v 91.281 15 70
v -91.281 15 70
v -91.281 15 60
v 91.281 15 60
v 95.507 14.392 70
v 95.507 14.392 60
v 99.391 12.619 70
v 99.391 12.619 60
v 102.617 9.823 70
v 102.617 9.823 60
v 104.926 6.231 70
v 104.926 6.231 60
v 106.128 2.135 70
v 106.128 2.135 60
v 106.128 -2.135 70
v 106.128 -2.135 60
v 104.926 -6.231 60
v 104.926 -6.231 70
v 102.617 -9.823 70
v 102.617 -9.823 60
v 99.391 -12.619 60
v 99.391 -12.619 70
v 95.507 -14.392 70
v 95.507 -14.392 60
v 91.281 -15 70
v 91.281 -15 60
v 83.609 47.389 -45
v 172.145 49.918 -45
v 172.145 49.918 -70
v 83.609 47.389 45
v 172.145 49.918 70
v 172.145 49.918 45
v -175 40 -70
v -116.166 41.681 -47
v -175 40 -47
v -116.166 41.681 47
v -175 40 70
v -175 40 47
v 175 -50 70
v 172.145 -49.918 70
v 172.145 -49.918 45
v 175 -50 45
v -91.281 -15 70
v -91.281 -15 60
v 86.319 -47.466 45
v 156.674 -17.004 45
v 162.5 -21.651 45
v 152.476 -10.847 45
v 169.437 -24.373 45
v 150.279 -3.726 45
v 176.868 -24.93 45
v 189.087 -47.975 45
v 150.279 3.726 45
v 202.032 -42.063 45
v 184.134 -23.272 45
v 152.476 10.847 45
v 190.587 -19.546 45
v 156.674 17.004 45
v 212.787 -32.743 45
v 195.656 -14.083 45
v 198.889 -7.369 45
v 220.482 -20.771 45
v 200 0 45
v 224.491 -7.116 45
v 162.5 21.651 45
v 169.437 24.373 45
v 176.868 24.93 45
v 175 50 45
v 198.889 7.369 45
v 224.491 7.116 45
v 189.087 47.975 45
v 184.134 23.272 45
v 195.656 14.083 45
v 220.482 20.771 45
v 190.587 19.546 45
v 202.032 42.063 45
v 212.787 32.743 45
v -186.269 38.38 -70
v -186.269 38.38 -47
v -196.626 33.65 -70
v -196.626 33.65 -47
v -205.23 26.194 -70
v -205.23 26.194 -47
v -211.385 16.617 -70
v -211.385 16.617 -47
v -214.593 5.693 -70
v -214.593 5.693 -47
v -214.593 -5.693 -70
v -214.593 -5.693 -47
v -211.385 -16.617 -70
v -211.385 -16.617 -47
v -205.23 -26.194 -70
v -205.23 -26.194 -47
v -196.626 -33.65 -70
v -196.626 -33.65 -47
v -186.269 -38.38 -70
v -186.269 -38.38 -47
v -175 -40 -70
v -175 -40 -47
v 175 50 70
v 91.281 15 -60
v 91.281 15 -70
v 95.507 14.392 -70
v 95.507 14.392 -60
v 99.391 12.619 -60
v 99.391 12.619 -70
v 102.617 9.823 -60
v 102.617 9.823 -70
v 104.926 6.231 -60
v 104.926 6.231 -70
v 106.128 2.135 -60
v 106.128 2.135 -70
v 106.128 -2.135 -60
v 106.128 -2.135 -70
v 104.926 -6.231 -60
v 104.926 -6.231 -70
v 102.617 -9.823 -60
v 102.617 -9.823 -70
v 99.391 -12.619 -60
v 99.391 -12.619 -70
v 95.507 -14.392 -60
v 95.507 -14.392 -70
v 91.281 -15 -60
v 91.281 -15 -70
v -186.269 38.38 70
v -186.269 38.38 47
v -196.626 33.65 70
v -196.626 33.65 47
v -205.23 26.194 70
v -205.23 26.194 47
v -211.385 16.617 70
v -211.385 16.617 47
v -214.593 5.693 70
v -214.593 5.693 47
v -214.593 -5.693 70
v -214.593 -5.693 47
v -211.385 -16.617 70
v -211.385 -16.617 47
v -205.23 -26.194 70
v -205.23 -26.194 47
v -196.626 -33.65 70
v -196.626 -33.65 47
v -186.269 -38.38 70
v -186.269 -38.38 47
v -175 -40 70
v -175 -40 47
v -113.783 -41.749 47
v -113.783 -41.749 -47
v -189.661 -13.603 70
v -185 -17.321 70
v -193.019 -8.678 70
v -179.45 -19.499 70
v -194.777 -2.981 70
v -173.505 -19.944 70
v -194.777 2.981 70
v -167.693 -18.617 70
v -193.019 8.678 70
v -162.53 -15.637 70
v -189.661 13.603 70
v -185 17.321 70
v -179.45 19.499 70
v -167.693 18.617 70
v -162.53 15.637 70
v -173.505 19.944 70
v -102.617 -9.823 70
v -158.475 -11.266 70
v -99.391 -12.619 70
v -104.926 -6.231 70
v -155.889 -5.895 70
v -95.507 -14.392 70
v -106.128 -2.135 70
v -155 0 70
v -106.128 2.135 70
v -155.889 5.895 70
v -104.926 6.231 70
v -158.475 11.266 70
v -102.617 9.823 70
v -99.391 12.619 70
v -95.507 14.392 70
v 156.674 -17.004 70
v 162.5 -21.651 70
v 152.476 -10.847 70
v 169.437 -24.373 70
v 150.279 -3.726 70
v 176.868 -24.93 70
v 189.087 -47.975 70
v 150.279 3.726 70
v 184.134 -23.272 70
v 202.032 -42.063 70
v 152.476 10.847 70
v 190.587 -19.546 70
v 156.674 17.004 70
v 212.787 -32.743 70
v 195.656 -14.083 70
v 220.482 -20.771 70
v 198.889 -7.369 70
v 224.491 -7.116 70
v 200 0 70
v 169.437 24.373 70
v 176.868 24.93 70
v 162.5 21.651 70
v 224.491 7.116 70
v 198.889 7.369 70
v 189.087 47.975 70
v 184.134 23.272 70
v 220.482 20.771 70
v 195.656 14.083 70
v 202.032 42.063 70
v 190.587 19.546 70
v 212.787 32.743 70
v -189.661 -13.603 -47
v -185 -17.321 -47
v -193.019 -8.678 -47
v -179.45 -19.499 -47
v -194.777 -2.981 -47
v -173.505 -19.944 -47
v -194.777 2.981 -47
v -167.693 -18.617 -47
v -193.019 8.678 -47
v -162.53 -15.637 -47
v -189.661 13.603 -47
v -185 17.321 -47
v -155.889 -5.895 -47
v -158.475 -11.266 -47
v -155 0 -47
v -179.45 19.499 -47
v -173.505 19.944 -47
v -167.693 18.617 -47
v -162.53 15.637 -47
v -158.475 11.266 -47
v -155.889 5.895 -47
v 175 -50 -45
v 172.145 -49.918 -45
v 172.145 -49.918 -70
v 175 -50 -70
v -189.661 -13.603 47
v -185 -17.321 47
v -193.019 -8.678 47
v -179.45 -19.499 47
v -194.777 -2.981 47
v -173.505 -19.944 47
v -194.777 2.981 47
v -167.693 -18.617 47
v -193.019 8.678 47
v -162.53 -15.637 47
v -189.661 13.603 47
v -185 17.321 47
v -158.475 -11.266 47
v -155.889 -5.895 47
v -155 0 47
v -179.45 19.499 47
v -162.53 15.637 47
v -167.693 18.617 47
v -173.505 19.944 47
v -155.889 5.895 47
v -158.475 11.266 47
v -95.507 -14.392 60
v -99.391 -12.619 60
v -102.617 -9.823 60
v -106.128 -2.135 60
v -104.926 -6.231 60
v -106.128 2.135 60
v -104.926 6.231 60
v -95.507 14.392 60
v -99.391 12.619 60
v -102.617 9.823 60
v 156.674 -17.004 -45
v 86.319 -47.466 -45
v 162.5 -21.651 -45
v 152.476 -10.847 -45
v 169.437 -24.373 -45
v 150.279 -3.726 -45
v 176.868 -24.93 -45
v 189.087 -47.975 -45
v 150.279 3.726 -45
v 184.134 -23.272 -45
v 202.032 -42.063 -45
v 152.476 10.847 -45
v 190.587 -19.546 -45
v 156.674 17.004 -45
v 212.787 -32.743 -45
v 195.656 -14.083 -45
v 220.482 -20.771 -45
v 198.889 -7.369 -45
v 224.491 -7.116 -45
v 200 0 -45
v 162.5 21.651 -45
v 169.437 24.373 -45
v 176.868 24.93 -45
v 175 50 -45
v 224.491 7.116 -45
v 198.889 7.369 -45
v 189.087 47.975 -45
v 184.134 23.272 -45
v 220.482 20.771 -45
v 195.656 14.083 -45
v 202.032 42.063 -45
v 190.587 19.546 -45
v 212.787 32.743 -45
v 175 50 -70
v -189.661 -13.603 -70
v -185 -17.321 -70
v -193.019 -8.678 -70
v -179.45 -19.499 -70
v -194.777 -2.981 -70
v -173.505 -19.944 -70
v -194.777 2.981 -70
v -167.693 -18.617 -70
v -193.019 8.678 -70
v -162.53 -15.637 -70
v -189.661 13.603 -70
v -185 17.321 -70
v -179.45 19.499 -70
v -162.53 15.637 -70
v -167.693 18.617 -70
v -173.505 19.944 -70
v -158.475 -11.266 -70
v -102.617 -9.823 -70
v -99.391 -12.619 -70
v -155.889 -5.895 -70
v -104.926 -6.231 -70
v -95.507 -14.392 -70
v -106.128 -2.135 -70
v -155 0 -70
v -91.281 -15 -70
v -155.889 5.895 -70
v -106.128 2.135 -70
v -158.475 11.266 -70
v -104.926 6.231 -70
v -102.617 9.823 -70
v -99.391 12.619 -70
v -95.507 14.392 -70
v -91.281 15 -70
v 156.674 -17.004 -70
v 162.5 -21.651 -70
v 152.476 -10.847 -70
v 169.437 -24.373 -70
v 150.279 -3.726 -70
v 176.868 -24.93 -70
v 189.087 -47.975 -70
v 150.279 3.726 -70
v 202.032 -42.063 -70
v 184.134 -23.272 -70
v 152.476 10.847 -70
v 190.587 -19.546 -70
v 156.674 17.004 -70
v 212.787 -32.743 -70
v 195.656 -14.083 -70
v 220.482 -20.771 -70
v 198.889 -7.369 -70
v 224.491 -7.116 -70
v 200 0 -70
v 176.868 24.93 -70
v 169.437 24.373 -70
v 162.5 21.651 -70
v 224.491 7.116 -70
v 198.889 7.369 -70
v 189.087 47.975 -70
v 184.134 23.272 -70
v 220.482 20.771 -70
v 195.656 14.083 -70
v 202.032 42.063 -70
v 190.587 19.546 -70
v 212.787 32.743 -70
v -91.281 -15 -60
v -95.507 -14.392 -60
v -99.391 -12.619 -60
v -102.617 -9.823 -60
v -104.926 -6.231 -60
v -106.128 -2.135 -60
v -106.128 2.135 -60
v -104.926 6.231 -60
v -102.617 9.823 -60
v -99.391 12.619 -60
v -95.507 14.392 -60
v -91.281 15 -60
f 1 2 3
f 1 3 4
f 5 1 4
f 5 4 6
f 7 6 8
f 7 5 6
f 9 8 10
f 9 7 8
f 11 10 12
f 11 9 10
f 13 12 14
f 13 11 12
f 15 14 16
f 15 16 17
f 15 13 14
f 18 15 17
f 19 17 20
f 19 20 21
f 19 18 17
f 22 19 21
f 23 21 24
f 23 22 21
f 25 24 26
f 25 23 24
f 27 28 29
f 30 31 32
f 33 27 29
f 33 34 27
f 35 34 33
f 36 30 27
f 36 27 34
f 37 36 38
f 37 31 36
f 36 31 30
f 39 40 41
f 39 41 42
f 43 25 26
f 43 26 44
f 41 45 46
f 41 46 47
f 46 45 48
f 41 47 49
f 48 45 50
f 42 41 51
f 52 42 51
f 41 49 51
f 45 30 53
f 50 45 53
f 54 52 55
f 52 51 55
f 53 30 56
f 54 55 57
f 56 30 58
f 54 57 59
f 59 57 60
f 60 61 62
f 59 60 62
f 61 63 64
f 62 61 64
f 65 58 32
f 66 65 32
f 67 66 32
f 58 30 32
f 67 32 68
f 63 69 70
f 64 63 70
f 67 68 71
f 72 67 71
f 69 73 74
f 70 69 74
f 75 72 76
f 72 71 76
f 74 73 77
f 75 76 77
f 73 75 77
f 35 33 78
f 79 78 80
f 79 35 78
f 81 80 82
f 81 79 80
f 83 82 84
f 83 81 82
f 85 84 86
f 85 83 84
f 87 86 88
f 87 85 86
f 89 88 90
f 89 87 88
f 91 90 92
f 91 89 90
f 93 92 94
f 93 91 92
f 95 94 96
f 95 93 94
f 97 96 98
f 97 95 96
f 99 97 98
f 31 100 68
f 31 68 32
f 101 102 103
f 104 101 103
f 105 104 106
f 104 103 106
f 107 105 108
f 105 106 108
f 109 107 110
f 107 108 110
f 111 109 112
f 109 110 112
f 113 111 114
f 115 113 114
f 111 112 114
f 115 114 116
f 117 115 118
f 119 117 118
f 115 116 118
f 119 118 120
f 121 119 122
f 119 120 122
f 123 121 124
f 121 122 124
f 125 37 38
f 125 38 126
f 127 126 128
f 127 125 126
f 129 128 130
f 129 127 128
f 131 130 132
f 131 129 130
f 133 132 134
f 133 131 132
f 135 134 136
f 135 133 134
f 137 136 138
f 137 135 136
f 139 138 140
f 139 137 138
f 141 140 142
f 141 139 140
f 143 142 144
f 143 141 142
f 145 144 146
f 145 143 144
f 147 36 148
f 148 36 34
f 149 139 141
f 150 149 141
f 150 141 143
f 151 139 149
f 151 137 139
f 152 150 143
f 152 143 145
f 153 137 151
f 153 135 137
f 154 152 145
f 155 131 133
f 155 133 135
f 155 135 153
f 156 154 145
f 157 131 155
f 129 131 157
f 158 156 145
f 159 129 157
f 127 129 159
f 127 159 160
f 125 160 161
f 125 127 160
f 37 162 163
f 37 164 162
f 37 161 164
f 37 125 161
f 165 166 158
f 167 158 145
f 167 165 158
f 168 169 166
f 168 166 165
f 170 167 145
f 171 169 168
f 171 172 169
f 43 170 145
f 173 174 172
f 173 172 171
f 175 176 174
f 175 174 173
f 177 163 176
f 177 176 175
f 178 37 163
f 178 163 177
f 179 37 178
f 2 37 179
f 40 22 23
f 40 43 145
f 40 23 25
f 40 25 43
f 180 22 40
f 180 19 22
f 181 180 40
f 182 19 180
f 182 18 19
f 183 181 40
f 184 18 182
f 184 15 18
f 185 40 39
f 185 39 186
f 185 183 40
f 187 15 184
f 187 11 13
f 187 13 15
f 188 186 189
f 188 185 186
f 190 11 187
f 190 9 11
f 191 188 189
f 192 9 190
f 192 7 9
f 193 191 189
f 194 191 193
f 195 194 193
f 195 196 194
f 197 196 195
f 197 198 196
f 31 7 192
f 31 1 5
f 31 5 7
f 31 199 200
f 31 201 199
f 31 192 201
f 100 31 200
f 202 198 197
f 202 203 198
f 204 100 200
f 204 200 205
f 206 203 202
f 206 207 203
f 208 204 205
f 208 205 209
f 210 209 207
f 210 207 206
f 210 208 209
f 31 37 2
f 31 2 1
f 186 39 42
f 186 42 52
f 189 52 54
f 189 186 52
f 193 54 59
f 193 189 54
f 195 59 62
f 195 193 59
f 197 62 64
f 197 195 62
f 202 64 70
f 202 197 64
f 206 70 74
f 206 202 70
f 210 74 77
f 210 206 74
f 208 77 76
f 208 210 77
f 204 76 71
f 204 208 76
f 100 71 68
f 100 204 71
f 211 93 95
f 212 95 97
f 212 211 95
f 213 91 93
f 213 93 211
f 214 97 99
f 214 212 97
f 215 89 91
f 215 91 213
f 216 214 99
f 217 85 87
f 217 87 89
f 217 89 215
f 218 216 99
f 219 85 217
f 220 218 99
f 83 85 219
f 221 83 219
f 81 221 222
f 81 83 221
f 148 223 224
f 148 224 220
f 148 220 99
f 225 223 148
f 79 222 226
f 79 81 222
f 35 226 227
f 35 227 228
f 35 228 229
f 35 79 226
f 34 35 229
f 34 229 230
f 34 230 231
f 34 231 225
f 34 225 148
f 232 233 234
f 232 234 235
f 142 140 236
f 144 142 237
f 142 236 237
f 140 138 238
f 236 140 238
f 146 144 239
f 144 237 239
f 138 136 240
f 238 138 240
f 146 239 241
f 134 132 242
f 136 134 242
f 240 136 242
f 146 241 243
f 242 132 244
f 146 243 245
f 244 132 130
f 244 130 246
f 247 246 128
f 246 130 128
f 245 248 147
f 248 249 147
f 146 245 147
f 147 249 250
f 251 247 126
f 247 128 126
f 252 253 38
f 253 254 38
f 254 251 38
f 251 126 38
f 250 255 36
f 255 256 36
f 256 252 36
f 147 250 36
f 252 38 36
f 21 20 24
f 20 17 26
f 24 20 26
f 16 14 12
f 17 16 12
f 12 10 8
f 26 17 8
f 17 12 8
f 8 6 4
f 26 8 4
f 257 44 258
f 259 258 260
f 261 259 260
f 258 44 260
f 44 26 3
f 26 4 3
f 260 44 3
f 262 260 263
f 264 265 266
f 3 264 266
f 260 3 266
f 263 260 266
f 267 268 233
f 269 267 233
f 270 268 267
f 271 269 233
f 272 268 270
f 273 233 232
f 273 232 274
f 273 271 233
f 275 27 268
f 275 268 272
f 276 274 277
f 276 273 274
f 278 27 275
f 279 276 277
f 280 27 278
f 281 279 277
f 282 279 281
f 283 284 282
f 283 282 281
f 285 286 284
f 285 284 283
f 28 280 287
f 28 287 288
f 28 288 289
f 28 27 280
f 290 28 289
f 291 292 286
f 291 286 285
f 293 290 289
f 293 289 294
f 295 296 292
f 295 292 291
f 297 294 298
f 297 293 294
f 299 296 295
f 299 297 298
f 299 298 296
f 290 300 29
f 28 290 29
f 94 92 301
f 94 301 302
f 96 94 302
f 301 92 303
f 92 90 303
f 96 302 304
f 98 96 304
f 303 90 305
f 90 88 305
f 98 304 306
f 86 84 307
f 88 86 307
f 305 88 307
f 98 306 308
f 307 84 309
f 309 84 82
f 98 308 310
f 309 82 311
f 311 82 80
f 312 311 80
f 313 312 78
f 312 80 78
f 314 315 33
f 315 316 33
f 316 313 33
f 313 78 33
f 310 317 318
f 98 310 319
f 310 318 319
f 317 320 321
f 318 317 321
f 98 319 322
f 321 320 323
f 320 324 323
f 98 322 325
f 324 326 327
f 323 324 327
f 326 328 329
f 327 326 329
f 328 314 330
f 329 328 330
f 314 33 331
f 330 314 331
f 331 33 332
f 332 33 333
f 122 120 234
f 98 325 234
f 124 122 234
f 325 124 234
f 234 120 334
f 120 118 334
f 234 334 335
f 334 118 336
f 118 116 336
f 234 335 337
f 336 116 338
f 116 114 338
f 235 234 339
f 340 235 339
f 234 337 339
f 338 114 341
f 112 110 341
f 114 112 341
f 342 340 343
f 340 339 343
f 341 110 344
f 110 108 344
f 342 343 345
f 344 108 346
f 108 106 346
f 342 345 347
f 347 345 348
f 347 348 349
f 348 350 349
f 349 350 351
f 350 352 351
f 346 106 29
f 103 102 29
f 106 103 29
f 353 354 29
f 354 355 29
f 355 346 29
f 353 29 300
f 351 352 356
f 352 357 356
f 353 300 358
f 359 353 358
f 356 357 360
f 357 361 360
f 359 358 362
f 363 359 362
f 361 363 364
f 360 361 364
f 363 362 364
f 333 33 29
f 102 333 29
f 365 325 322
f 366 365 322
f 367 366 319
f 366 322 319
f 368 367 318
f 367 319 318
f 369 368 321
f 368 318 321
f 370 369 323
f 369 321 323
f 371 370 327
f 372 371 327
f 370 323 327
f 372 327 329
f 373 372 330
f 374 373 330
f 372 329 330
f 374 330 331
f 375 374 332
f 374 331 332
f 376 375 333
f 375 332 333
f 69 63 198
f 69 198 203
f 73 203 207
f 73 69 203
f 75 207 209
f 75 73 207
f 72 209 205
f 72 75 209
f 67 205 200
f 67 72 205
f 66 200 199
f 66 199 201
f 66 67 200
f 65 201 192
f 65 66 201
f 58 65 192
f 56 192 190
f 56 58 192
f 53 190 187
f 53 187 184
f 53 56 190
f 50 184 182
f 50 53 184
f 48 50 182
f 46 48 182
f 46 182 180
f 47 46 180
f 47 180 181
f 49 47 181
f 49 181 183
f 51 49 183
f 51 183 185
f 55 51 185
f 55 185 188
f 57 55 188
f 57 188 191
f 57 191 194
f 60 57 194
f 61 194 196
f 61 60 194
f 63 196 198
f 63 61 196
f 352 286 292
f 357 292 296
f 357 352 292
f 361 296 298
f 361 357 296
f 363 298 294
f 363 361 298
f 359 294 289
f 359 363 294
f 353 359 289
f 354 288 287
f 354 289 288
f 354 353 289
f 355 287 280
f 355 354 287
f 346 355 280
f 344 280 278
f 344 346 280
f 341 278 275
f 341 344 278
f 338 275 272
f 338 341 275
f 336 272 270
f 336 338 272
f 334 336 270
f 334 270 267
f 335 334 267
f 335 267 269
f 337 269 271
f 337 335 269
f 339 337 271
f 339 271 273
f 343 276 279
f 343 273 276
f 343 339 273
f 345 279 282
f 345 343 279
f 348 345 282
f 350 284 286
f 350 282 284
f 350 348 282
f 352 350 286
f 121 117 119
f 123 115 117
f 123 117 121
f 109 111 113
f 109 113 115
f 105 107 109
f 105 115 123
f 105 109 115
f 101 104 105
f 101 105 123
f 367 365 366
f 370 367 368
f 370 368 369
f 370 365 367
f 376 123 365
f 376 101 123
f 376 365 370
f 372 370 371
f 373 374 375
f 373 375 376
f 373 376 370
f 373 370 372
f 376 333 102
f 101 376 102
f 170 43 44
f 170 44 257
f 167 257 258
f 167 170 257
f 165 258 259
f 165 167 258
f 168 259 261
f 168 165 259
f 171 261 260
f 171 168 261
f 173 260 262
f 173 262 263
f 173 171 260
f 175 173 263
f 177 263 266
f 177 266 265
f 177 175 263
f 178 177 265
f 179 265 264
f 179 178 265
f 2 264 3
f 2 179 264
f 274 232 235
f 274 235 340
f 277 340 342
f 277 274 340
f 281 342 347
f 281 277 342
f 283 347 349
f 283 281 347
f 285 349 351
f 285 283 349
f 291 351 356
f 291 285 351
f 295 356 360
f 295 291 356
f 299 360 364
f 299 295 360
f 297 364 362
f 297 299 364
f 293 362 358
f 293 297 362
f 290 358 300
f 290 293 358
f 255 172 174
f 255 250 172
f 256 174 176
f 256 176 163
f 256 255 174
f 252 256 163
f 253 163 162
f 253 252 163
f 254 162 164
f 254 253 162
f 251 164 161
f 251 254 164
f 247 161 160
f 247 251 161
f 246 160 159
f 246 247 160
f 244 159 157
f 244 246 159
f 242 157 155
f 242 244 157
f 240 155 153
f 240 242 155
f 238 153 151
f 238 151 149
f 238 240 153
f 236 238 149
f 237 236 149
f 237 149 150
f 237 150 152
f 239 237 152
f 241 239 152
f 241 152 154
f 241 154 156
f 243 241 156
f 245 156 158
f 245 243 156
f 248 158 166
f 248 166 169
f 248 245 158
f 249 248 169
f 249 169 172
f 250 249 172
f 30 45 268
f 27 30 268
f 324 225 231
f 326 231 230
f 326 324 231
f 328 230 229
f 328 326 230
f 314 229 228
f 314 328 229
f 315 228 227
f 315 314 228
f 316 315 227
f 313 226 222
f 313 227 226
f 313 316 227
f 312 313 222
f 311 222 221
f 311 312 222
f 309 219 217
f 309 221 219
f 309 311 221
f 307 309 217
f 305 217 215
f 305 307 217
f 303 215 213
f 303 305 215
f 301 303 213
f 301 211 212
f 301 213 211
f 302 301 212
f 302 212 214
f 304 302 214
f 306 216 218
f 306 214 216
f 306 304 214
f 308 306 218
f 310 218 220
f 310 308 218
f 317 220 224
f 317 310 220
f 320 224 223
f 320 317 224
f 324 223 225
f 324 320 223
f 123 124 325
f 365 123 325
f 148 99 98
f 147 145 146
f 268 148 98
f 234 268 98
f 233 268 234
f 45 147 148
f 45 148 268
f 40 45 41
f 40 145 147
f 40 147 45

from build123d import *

# Parameters (mm, degrees)
SKETCH1_R           = 20
SKETCH1_R_2         = 25
BOSS_EXTRUDE1_DEPTH = 70
SKETCH2_W           = 100
SKETCH2_H           = 94
SKETCH2_W_2         = 140
SKETCH2_H_2         = 90
CUT_EXTRUDE1_DEPTH  = 256.191648227
SKETCH3_W           = 2.284781912
SKETCH3_H           = 94
CUT_EXTRUDE4_DEPTH  = 45
CUT_EXTRUDE5_DEPTH  = 10


with BuildPart() as part:
    # Sketch1 → Boss-Extrude1 (new, symmetric)
    with BuildSketch(Plane.XY):
        with BuildLine():
            Line((172.145187602, 49.918433931), (-175, 40))
            ThreePointArc((-175, 40), (-215, 0), (-175, -40))
            Line((-175, -40), (172.145187602, -49.918433931))
            Line((172.145187602, -49.918433931), (175, -50))
            ThreePointArc((175, -50), (225, 0), (175, 50))
            Line((175, 50), (172.145187602, 49.918433931))
        make_face()
        with Locations((-175, 0)):
            Circle(SKETCH1_R, mode=Mode.SUBTRACT)
        with Locations((175, 0)):
            Circle(SKETCH1_R_2, mode=Mode.SUBTRACT)
    extrude(amount=BOSS_EXTRUDE1_DEPTH, both=True)

    # Sketch2 → Cut-Extrude1 (cut, through all)
    with BuildSketch(Plane(origin=(-1.284665579, 44.963295269, 0), x_dir=(0.9995920864606948, 0.028559773898877126, 0), z_dir=(-0.02855977389887713, 0.9995920864606949, 0))):
        with Locations((-164.928615131, 0)):
            Rectangle(SKETCH2_W, SKETCH2_H)
        with Locations((154.928615131, 0)):
            Rectangle(SKETCH2_W_2, SKETCH2_H_2)
    extrude(amount=-CUT_EXTRUDE1_DEPTH, mode=Mode.SUBTRACT)

    # Sketch3 → Cut-Extrude4 (cut, symmetric)
    with BuildSketch(Plane(origin=(-1.284665579, 44.963295269, 0), x_dir=(0.9995920864606948, 0.02855977389887712, 0), z_dir=(-0.028559773898877122, 0.9995920864606949, 0))):
        with Locations((-174.928615131, 0)):
            Rectangle(SKETCH3_W, SKETCH3_H)
    extrude(amount=CUT_EXTRUDE4_DEPTH, both=True, mode=Mode.SUBTRACT)

    # Sketch4 → Cut-Extrude5 (cut)
    with BuildSketch(Plane.XY.offset(70)):
        with BuildLine():
            Line((-91.281137221, 15), (91.281137221, 15))
            ThreePointArc((91.281137221, 15), (106.281137221, 0), (91.281137221, -15))
            Line((91.281137221, -15), (-91.281137221, -15))
            ThreePointArc((-91.281137221, -15), (-106.281137221, 0), (-91.281137221, 15))
        make_face()
    cut_extrude5 = extrude(amount=-CUT_EXTRUDE5_DEPTH, mode=Mode.SUBTRACT)

    # Mirror1: Cut-Extrude5 across plane
    add(cut_extrude5.mirror(Plane.XY), mode=Mode.SUBTRACT)


solid = part.part
